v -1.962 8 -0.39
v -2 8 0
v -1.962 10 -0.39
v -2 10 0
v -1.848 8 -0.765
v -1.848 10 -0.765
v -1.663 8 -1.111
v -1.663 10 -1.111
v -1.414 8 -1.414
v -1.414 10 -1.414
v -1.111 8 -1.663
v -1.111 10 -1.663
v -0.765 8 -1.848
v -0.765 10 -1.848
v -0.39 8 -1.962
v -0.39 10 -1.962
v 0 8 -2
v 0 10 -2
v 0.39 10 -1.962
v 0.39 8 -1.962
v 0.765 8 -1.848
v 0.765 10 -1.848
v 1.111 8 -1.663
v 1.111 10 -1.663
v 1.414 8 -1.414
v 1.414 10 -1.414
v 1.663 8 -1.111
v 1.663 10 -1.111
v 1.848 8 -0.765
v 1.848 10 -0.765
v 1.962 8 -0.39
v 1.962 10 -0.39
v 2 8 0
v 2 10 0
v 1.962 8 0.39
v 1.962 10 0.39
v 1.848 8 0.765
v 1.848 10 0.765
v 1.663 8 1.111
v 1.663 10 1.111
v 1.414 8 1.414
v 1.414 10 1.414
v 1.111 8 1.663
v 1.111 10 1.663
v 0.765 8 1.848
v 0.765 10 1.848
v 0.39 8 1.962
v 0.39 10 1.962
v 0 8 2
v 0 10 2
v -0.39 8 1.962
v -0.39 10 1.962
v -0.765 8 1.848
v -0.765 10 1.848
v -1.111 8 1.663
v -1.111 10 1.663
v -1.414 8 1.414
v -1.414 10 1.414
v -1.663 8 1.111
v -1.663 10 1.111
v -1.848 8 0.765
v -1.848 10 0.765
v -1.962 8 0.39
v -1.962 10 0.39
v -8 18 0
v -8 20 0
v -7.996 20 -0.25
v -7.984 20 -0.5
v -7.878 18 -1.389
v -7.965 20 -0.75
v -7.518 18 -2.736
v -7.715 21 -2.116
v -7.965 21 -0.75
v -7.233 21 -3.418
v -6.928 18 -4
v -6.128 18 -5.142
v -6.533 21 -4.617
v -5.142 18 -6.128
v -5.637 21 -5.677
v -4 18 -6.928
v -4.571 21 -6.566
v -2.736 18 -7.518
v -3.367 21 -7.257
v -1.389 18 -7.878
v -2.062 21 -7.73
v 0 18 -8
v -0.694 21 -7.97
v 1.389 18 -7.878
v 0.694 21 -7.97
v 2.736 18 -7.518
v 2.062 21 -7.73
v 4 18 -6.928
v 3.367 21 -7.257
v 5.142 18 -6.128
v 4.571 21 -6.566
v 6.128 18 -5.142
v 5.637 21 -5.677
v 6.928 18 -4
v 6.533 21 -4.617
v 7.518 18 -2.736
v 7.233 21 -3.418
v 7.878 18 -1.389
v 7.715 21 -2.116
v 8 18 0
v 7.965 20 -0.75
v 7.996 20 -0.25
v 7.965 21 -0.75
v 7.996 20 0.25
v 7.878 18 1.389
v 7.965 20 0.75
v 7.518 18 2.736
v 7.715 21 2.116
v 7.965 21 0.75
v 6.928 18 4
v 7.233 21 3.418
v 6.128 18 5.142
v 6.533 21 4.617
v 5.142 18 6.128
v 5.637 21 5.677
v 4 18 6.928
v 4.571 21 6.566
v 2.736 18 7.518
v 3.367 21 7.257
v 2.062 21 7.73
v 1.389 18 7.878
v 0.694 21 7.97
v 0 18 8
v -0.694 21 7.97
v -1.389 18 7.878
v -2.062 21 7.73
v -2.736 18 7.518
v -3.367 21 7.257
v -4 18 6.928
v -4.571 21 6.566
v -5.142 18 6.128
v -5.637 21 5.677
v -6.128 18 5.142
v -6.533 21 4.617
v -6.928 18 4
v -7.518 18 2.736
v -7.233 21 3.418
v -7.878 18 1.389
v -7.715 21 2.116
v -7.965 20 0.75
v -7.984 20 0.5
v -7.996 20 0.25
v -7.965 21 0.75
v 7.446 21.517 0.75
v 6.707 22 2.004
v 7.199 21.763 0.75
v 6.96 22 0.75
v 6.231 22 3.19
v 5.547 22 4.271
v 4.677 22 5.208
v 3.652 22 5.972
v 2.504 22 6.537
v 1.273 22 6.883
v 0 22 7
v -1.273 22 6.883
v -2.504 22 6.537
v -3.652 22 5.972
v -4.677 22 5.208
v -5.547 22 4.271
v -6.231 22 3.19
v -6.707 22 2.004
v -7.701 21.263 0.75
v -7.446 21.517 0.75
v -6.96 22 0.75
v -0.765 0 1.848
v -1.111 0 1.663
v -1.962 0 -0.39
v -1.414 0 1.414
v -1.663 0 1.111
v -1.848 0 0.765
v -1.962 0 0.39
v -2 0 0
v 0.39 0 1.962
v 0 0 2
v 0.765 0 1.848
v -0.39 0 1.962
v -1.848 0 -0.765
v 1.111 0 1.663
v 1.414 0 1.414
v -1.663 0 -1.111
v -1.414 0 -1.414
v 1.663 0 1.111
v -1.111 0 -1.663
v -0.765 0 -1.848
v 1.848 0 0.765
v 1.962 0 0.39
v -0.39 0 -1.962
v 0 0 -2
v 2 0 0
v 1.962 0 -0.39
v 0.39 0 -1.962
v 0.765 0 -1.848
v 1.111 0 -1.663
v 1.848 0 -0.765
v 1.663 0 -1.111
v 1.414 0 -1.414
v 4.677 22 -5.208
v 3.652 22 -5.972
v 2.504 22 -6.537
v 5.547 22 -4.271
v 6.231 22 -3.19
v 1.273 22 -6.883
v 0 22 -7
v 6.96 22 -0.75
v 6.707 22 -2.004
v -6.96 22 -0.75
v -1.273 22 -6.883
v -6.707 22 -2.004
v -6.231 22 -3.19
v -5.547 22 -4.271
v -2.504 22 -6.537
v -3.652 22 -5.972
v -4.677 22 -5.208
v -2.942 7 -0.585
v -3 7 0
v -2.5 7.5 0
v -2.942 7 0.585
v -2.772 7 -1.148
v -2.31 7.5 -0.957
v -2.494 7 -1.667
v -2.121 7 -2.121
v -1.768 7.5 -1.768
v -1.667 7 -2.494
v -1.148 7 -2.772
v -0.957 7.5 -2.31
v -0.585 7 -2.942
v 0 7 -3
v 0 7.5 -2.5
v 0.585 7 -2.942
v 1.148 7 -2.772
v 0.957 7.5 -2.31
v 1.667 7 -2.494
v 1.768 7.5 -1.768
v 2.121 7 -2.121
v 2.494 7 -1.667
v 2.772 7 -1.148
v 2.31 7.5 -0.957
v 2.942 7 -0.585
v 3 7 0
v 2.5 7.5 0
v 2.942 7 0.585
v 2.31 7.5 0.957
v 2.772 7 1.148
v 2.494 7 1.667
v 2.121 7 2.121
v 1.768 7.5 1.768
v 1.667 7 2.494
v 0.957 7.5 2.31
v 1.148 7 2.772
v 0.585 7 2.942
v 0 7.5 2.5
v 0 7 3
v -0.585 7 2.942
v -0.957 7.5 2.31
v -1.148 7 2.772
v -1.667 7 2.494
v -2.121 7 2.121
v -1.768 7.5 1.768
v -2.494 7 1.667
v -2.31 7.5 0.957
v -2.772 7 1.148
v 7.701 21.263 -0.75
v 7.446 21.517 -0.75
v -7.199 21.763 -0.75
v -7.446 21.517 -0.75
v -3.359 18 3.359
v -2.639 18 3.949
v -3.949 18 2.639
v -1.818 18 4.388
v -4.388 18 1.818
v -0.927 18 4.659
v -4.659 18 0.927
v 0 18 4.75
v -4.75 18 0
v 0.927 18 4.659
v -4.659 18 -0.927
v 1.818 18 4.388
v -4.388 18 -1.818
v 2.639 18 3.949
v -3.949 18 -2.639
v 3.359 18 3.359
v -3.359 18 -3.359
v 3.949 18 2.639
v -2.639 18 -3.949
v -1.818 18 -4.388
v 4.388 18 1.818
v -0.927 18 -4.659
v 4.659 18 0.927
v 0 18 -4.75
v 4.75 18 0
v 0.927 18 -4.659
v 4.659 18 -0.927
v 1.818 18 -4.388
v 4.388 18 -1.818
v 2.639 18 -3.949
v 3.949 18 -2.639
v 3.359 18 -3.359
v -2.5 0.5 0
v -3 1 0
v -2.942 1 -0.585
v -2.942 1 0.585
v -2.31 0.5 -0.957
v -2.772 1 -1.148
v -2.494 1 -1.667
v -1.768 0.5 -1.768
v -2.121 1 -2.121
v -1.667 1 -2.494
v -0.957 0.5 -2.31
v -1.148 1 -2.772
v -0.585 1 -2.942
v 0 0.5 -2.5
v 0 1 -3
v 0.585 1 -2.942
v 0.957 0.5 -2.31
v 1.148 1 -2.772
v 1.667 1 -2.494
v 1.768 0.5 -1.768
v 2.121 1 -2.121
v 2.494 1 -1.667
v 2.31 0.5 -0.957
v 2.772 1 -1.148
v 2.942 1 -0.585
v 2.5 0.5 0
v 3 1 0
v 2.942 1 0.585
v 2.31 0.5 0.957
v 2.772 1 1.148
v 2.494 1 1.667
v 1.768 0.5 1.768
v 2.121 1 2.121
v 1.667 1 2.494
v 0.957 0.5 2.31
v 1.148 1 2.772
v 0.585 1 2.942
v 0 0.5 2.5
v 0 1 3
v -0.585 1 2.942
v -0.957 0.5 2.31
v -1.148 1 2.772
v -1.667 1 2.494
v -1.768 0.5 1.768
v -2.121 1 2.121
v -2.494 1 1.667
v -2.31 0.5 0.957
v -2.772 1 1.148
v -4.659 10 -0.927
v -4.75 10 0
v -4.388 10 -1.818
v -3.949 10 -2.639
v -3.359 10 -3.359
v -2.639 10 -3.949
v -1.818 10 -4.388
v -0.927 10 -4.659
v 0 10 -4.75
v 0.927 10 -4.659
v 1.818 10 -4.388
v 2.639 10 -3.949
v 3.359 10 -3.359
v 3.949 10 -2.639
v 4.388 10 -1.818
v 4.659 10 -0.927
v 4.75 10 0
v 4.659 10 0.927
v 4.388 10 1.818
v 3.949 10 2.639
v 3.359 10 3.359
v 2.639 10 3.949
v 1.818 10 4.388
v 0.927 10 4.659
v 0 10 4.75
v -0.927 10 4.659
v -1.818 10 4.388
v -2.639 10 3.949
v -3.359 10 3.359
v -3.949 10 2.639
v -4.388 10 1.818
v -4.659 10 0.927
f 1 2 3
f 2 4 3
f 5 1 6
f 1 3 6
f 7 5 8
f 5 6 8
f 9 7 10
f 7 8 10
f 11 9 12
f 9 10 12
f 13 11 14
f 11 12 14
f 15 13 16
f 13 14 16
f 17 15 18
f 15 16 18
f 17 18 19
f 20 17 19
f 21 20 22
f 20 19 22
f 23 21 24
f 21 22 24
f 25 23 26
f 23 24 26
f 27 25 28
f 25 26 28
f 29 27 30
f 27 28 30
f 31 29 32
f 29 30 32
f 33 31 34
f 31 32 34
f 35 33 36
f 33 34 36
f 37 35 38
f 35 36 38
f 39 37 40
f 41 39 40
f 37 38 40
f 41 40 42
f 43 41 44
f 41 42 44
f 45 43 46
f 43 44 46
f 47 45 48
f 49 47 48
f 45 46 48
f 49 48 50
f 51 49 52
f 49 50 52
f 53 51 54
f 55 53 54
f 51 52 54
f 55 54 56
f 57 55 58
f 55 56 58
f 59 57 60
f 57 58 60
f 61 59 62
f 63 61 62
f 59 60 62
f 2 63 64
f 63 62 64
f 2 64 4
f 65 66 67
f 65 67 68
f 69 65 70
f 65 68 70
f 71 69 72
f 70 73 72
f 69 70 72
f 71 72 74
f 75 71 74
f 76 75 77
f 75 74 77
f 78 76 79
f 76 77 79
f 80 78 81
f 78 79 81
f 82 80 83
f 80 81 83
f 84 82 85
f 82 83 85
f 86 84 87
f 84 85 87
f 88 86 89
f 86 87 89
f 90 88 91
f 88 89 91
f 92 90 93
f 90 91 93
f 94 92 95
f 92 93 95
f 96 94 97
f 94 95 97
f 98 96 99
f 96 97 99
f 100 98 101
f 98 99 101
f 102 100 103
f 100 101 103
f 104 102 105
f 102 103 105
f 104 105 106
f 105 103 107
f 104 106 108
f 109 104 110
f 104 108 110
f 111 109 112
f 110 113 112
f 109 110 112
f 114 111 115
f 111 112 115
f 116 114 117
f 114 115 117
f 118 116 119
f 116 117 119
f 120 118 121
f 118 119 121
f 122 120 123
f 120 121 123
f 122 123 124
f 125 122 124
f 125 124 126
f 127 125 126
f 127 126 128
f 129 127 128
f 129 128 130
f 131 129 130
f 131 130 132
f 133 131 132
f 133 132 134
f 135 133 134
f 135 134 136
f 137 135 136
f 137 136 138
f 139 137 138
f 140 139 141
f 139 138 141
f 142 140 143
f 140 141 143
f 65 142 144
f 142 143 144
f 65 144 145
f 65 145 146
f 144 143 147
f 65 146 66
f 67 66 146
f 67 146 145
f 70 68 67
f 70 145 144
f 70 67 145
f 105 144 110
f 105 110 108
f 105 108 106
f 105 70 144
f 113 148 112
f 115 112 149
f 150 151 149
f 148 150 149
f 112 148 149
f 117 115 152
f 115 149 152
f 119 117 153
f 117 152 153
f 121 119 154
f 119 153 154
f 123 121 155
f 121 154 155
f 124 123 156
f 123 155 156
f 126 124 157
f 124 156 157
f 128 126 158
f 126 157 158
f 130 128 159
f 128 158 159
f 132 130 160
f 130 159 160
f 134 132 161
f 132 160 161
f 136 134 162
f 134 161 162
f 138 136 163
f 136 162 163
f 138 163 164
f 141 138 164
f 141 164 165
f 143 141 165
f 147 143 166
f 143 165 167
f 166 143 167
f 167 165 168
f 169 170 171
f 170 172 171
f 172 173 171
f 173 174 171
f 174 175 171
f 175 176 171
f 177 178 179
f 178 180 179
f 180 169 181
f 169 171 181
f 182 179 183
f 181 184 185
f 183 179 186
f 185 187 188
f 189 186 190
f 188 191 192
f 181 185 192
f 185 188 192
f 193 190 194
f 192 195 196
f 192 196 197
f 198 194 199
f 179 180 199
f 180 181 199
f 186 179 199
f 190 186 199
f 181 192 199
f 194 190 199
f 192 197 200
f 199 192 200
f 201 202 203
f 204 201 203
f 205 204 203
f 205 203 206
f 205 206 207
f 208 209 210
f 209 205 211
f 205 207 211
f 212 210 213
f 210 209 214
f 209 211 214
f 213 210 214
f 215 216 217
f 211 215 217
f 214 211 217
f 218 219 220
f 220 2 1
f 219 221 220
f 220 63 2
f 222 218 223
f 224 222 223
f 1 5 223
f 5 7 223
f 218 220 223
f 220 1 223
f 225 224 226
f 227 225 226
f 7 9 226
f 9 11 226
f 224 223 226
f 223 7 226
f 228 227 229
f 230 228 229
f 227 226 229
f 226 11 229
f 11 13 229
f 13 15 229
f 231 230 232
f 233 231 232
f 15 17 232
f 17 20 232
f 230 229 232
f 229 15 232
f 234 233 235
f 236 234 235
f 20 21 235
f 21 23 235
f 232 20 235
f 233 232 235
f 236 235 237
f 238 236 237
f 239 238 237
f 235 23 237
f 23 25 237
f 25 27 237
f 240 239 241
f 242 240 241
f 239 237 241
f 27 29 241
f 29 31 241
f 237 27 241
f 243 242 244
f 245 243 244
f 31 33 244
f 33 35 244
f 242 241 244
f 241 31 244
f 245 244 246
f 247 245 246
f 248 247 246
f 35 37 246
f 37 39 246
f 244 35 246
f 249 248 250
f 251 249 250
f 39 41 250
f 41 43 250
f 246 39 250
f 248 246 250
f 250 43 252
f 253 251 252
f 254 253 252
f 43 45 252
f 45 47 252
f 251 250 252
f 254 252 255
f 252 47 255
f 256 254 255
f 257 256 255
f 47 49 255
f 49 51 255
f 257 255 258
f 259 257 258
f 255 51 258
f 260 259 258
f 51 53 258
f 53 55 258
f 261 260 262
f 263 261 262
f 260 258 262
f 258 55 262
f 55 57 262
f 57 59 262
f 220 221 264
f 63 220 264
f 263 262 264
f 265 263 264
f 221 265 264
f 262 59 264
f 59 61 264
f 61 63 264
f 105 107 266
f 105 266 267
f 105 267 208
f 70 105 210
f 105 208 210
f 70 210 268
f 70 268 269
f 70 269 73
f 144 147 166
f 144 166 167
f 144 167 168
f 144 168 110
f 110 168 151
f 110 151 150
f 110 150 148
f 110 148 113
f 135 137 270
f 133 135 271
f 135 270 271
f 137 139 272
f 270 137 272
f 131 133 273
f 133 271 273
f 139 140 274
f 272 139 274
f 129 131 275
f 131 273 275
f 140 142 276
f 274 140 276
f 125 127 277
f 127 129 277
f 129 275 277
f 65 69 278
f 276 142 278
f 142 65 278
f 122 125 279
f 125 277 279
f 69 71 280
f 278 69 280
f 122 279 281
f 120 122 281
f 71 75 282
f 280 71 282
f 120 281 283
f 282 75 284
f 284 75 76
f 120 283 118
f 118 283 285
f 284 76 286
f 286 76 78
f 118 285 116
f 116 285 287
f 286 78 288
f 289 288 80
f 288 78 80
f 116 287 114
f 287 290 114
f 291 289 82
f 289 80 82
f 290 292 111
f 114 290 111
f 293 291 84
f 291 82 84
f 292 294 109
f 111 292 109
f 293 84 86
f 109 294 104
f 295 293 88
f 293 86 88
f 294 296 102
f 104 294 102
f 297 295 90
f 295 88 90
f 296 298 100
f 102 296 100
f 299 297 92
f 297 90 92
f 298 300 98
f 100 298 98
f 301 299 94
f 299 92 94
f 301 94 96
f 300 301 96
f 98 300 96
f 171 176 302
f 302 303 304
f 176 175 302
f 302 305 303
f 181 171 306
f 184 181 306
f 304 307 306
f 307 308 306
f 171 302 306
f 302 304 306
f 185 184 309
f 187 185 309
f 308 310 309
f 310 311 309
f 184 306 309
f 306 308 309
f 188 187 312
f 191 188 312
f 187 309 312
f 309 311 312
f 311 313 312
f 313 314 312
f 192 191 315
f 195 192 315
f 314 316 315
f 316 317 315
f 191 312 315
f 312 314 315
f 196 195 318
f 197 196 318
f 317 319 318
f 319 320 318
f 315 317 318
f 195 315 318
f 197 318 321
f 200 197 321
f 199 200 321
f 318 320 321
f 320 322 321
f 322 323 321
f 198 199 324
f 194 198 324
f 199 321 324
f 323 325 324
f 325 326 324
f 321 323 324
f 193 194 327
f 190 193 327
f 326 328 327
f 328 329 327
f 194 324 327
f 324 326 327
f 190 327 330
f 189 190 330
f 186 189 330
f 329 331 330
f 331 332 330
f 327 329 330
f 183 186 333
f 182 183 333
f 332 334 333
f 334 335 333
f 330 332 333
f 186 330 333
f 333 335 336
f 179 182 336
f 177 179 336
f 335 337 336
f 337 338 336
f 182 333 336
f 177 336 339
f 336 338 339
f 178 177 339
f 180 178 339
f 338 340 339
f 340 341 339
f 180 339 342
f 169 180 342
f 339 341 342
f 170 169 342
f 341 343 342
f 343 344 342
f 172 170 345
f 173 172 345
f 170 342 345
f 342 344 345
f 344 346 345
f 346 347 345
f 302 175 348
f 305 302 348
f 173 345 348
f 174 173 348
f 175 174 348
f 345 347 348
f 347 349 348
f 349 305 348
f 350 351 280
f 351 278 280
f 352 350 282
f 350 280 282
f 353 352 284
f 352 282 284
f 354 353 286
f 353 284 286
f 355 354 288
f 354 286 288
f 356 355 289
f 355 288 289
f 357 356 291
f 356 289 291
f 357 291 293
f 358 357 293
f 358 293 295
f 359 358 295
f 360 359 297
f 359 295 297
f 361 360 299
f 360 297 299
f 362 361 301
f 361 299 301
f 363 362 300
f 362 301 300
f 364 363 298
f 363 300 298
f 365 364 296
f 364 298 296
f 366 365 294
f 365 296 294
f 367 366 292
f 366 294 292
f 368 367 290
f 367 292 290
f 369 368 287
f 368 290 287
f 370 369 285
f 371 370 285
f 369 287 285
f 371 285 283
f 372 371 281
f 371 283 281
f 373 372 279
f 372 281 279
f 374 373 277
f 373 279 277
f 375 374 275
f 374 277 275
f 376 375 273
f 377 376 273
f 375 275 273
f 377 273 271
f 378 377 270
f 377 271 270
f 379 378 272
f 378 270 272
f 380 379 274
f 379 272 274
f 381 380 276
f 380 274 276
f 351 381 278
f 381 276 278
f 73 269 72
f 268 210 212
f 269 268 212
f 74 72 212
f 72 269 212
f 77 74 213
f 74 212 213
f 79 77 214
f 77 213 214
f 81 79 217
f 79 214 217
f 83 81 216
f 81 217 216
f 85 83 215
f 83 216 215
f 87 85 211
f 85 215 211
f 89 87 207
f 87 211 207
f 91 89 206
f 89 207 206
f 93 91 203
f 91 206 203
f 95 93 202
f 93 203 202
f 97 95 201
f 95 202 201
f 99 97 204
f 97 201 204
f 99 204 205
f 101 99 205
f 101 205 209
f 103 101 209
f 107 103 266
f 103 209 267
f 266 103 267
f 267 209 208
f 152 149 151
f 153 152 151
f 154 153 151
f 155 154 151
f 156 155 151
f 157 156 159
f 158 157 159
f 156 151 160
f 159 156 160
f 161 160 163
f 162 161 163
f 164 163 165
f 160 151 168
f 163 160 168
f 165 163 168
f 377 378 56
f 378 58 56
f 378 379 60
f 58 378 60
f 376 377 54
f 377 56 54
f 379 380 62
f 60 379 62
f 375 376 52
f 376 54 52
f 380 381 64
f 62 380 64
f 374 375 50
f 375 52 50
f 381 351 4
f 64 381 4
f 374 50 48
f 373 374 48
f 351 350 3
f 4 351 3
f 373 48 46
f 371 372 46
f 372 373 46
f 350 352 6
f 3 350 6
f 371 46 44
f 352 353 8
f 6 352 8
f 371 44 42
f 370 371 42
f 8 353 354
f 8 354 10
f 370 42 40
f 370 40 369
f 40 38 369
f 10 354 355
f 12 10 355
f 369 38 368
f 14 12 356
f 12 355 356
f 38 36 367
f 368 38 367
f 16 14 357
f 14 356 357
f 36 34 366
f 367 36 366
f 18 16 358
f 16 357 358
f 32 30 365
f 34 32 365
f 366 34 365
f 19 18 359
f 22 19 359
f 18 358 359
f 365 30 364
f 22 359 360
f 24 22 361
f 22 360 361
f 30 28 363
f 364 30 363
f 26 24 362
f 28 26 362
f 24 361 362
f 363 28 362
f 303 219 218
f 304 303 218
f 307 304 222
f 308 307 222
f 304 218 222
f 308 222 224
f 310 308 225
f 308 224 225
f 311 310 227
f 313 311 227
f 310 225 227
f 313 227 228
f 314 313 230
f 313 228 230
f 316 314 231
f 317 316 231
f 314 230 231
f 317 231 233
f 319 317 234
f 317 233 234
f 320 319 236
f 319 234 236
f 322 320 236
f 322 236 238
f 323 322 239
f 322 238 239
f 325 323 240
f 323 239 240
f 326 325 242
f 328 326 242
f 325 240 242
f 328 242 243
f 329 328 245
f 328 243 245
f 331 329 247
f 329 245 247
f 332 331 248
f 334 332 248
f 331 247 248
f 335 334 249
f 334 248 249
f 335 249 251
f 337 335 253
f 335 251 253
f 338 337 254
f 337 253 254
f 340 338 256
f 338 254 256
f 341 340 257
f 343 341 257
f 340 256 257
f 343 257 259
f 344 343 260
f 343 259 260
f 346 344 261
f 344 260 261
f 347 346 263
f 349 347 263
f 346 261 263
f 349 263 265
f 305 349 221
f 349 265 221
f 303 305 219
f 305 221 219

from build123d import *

# Parameters (mm, degrees)
CHAMFER_2_SIZE      = 1
CUT_EXTRUDE_1_DEPTH = 2


with BuildPart() as part:
    # 草图1 → 旋转1 (revolve)
    with BuildSketch(Plane.XY, mode=Mode.PRIVATE) as revolve_1_sk:
        Polygon((0, 0), (3, 0), (3, 8), (2, 8), (2, 10), (4.75, 10), (4.75, 18), (8, 18), (8, 22), (0, 22), align=None)
    revolve(revolve_1_sk.sketch.rotate(Axis((0, 22, 0), (0, -1, 0)), 180), axis=Axis((0, 22, 0), (0, -1, 0)))

    # 倒角2
    chamfer_2_edges = [part.edges().sort_by_distance(p)[0] for p in [
        (3, 8, 0),
        (3, 0, 0),
        (8, 22, 0),
    ]]
    chamfer(chamfer_2_edges, length=CHAMFER_2_SIZE - 0.0001)  # a hair under: the kernel refuses the full size

    # 草图2 → 切除-拉伸1 (cut)
    with BuildSketch(Plane(origin=(0, 22, 0), x_dir=(1, 0, 0), z_dir=(0, 1, 0))):
        with BuildLine():
            Line((-7.964766161, -0.75), (7.964766161, -0.75))
            ThreePointArc((7.964766161, -0.75), (8, 0), (7.964766161, 0.75))
            Line((7.964766161, 0.75), (-7.964766161, 0.75))
            ThreePointArc((-7.964766161, 0.75), (-8, 0), (-7.964766161, -0.75))
        make_face()
    extrude(amount=-CUT_EXTRUDE_1_DEPTH, mode=Mode.SUBTRACT)


solid = part.part
